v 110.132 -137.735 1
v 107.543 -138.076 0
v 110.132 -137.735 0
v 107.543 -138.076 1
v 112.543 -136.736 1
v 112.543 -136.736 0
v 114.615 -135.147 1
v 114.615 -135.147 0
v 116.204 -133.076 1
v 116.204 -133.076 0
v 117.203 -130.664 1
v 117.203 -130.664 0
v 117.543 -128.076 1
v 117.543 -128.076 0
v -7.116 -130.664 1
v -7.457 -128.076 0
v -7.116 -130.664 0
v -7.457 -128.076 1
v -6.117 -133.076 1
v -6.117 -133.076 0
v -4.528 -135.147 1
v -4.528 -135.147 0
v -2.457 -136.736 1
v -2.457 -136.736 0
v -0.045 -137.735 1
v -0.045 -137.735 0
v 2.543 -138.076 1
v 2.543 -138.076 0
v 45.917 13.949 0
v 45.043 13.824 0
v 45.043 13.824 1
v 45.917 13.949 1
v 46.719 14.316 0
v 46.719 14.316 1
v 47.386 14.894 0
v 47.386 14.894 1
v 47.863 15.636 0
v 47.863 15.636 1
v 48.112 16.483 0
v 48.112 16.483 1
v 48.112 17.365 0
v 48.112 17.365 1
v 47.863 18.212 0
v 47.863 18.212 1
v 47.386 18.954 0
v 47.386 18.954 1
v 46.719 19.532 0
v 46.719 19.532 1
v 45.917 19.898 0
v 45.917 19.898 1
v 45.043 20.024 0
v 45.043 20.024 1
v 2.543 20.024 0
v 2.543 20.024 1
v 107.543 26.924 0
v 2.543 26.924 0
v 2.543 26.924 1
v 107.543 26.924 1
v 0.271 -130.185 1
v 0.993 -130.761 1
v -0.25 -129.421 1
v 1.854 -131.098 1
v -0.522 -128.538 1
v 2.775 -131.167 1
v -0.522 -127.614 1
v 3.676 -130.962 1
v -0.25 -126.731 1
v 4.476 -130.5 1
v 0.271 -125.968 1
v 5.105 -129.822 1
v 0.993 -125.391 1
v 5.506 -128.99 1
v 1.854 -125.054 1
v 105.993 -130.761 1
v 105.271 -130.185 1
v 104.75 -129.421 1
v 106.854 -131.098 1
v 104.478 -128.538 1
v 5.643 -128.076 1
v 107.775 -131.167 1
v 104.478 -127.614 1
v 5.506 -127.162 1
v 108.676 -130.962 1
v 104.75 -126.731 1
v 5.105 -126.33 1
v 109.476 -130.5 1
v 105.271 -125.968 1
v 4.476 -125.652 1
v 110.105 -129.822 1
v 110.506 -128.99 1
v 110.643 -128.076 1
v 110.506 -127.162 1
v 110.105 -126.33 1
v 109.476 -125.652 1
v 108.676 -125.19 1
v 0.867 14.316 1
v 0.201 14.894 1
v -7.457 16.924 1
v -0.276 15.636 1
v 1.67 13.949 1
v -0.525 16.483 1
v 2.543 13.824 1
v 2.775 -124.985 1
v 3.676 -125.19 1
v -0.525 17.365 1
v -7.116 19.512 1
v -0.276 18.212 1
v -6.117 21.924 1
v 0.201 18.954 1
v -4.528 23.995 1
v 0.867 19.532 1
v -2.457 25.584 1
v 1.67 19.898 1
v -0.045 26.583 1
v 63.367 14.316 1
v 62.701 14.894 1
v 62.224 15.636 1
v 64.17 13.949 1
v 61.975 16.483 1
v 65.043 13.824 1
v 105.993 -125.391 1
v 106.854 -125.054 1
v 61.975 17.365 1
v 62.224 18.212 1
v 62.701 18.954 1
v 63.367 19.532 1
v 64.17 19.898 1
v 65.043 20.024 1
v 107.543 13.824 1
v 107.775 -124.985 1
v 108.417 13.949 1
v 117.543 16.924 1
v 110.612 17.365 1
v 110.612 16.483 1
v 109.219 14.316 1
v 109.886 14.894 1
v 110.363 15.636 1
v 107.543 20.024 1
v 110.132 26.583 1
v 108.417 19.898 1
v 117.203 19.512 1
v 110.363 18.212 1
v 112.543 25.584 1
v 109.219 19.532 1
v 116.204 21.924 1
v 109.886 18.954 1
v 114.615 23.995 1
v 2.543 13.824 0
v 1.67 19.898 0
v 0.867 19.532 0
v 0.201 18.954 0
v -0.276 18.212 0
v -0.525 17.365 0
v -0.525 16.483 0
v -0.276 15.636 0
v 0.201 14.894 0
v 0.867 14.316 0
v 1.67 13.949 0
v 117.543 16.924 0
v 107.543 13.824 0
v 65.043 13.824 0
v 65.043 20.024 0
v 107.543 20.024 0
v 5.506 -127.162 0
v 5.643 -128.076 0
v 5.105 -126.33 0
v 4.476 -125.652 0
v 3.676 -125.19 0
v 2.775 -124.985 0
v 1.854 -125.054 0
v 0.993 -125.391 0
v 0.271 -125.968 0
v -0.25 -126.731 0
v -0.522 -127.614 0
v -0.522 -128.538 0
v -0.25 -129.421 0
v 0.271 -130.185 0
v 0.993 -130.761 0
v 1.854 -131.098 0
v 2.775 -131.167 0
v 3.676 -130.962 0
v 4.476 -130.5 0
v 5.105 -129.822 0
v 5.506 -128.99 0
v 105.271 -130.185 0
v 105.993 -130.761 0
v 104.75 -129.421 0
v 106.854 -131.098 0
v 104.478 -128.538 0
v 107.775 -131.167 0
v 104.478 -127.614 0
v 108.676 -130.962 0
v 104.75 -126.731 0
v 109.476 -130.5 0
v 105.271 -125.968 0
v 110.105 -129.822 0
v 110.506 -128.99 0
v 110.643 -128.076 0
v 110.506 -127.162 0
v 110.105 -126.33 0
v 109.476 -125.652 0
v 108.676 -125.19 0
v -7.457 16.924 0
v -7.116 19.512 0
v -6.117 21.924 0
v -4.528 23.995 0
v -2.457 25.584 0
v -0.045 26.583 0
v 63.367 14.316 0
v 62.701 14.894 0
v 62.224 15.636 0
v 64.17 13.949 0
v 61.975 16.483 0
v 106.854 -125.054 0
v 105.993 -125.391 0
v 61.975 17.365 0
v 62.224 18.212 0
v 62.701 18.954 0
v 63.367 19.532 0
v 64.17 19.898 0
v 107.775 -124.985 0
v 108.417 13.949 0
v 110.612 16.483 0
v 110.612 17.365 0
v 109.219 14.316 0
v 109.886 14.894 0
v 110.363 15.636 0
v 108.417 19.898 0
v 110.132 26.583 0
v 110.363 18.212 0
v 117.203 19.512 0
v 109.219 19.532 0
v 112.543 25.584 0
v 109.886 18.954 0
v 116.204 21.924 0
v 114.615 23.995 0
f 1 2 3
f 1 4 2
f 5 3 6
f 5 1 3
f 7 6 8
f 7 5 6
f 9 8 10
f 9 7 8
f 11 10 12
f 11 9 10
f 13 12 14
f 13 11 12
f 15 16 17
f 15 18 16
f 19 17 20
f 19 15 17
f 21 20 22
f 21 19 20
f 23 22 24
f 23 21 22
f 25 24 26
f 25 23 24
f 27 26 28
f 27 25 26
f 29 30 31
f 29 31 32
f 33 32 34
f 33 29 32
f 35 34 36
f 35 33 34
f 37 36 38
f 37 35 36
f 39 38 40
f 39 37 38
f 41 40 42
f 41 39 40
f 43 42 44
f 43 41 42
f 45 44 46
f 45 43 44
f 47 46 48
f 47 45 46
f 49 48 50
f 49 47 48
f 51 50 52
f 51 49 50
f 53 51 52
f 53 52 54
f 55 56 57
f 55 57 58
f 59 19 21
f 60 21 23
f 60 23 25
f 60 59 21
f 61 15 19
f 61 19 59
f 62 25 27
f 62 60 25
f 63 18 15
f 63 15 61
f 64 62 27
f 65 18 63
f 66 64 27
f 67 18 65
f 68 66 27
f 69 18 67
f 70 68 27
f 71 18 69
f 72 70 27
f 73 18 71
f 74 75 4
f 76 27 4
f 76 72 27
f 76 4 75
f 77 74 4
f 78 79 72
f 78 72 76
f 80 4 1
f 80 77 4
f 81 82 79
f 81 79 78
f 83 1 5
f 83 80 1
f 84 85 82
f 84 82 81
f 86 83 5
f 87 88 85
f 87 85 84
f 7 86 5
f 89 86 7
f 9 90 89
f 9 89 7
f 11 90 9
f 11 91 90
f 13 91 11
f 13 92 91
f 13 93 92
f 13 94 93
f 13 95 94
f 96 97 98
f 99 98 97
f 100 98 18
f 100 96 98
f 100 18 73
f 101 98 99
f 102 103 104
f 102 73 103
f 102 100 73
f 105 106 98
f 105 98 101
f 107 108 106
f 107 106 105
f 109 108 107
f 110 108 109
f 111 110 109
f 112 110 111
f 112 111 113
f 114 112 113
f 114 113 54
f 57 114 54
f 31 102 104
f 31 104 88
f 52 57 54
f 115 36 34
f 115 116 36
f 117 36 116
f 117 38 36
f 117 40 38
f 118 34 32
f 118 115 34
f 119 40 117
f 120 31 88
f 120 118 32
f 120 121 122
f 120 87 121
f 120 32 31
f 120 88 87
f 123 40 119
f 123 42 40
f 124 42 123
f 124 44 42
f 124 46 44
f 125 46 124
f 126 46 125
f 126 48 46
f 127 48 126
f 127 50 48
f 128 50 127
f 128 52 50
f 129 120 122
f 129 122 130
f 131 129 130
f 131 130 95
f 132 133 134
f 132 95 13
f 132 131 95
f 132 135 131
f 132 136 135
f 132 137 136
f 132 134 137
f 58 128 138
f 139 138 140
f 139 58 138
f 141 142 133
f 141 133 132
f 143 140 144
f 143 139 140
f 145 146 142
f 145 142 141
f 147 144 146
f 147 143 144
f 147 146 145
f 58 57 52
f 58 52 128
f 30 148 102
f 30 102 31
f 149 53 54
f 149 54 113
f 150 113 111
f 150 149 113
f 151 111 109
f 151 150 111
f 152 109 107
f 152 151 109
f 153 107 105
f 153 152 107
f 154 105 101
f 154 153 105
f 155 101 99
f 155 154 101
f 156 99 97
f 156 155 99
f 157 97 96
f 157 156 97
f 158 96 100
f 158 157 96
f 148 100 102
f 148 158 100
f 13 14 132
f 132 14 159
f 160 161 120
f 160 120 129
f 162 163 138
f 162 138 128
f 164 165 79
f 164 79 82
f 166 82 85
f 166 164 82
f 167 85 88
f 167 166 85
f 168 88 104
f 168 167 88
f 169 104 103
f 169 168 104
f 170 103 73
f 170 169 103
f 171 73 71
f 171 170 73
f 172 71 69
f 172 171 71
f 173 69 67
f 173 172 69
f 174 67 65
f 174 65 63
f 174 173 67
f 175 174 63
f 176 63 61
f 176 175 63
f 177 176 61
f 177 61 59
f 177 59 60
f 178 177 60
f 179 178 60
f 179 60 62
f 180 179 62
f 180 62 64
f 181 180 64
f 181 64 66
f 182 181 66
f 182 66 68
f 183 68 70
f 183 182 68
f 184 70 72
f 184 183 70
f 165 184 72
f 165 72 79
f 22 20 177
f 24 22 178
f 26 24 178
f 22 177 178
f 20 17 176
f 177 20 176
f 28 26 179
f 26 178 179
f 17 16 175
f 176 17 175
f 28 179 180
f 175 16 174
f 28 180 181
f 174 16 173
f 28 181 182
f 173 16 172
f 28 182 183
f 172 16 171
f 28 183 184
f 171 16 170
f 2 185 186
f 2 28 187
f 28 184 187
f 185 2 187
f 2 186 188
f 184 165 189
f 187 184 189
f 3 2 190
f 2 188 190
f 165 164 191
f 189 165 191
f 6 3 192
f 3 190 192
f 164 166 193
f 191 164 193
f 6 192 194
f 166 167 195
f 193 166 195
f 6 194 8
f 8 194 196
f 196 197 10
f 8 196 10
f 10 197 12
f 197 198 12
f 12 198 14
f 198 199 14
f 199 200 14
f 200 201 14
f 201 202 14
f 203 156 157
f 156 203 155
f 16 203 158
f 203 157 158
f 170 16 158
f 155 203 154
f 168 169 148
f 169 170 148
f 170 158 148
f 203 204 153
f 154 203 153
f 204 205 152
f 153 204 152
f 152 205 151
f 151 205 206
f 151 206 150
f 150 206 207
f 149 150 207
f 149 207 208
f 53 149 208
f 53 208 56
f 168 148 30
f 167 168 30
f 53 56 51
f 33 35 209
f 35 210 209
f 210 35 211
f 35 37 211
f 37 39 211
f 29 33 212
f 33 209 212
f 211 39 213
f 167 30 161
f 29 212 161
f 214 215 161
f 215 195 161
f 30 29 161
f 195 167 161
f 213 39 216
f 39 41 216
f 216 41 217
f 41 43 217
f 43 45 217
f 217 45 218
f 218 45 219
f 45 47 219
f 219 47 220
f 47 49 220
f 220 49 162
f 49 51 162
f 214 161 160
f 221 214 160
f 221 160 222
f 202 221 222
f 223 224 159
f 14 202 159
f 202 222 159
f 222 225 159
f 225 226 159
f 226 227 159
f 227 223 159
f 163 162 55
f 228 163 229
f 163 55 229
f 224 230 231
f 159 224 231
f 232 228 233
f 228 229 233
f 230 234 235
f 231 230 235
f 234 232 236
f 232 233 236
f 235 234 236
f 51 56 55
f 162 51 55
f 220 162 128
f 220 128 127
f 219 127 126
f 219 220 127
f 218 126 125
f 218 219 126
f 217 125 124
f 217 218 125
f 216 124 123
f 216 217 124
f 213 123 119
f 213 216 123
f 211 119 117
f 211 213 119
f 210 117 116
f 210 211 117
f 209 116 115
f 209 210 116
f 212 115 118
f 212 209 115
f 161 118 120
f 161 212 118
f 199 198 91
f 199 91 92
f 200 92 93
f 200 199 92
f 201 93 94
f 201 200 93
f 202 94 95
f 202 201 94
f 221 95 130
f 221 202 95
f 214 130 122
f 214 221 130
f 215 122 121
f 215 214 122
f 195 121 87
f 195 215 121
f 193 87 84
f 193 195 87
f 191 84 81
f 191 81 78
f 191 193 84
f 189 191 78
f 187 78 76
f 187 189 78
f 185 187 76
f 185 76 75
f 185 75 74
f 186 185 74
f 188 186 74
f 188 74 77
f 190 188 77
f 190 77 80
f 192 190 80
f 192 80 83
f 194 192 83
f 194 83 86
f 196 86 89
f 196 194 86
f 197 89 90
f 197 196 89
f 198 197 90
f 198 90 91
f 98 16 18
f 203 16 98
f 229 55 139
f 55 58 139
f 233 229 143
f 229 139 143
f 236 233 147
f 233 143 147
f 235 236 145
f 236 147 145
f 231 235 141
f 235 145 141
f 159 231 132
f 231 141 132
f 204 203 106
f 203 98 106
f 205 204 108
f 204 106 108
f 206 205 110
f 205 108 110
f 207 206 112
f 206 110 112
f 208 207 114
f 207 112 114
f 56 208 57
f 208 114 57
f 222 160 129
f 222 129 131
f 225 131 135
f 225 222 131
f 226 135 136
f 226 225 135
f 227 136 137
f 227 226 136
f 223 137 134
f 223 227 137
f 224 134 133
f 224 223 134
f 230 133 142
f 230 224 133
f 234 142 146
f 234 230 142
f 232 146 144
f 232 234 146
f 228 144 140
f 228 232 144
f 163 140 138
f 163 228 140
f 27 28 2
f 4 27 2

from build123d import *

# Parameters (mm, degrees)
SKETCH_1_W      = 125
SKETCH_1_H      = 165
SKETCH_1_R      = 3.1
EXTRUDE_1_DEPTH = 1
FILLET_1_R      = 10


with BuildPart() as part:
    # 草图1 → 凸台-拉伸1 (new body)
    with BuildSketch(Plane.XY):
        with Locations((55.043478261, -55.576086957)):
            Rectangle(SKETCH_1_W, SKETCH_1_H)
        with Locations((107.543478261, -128.076086957)):
            Circle(SKETCH_1_R, mode=Mode.SUBTRACT)
        with Locations((2.543478261, -128.076086957)):
            Circle(SKETCH_1_R, mode=Mode.SUBTRACT)
        with BuildLine():
            Line((107.543478261, 20.023913043), (65.043478261, 20.023913043))
            ThreePointArc((65.043478261, 20.023913043), (61.943478261, 16.923913043), (65.043478261, 13.823913043))
            Line((65.043478261, 13.823913043), (107.543478261, 13.823913043))
            ThreePointArc((107.543478261, 13.823913043), (110.643478261, 16.923913043), (107.543478261, 20.023913043))
        make_face(mode=Mode.SUBTRACT)
        with BuildLine():
            Line((45.043478261, 20.023913043), (2.543478261, 20.023913043))
            ThreePointArc((2.543478261, 20.023913043), (-0.556521739, 16.923913043), (2.543478261, 13.823913043))
            Line((2.543478261, 13.823913043), (45.043478261, 13.823913043))
            ThreePointArc((45.043478261, 13.823913043), (48.143478261, 16.923913043), (45.043478261, 20.023913043))
        make_face(mode=Mode.SUBTRACT)
    extrude(amount=EXTRUDE_1_DEPTH)

    # 圆角1
    fillet_1_edges = [part.edges().sort_by_distance(p)[0] for p in [
        (-7.456521739, 26.923913043, 0.5),
        (117.543478261, 26.923913043, 0.5),
        (117.543478261, -138.076086957, 0.5),
        (-7.456521739, -138.076086957, 0.5),
    ]]
    fillet(fillet_1_edges, radius=FILLET_1_R)


solid = part.part
